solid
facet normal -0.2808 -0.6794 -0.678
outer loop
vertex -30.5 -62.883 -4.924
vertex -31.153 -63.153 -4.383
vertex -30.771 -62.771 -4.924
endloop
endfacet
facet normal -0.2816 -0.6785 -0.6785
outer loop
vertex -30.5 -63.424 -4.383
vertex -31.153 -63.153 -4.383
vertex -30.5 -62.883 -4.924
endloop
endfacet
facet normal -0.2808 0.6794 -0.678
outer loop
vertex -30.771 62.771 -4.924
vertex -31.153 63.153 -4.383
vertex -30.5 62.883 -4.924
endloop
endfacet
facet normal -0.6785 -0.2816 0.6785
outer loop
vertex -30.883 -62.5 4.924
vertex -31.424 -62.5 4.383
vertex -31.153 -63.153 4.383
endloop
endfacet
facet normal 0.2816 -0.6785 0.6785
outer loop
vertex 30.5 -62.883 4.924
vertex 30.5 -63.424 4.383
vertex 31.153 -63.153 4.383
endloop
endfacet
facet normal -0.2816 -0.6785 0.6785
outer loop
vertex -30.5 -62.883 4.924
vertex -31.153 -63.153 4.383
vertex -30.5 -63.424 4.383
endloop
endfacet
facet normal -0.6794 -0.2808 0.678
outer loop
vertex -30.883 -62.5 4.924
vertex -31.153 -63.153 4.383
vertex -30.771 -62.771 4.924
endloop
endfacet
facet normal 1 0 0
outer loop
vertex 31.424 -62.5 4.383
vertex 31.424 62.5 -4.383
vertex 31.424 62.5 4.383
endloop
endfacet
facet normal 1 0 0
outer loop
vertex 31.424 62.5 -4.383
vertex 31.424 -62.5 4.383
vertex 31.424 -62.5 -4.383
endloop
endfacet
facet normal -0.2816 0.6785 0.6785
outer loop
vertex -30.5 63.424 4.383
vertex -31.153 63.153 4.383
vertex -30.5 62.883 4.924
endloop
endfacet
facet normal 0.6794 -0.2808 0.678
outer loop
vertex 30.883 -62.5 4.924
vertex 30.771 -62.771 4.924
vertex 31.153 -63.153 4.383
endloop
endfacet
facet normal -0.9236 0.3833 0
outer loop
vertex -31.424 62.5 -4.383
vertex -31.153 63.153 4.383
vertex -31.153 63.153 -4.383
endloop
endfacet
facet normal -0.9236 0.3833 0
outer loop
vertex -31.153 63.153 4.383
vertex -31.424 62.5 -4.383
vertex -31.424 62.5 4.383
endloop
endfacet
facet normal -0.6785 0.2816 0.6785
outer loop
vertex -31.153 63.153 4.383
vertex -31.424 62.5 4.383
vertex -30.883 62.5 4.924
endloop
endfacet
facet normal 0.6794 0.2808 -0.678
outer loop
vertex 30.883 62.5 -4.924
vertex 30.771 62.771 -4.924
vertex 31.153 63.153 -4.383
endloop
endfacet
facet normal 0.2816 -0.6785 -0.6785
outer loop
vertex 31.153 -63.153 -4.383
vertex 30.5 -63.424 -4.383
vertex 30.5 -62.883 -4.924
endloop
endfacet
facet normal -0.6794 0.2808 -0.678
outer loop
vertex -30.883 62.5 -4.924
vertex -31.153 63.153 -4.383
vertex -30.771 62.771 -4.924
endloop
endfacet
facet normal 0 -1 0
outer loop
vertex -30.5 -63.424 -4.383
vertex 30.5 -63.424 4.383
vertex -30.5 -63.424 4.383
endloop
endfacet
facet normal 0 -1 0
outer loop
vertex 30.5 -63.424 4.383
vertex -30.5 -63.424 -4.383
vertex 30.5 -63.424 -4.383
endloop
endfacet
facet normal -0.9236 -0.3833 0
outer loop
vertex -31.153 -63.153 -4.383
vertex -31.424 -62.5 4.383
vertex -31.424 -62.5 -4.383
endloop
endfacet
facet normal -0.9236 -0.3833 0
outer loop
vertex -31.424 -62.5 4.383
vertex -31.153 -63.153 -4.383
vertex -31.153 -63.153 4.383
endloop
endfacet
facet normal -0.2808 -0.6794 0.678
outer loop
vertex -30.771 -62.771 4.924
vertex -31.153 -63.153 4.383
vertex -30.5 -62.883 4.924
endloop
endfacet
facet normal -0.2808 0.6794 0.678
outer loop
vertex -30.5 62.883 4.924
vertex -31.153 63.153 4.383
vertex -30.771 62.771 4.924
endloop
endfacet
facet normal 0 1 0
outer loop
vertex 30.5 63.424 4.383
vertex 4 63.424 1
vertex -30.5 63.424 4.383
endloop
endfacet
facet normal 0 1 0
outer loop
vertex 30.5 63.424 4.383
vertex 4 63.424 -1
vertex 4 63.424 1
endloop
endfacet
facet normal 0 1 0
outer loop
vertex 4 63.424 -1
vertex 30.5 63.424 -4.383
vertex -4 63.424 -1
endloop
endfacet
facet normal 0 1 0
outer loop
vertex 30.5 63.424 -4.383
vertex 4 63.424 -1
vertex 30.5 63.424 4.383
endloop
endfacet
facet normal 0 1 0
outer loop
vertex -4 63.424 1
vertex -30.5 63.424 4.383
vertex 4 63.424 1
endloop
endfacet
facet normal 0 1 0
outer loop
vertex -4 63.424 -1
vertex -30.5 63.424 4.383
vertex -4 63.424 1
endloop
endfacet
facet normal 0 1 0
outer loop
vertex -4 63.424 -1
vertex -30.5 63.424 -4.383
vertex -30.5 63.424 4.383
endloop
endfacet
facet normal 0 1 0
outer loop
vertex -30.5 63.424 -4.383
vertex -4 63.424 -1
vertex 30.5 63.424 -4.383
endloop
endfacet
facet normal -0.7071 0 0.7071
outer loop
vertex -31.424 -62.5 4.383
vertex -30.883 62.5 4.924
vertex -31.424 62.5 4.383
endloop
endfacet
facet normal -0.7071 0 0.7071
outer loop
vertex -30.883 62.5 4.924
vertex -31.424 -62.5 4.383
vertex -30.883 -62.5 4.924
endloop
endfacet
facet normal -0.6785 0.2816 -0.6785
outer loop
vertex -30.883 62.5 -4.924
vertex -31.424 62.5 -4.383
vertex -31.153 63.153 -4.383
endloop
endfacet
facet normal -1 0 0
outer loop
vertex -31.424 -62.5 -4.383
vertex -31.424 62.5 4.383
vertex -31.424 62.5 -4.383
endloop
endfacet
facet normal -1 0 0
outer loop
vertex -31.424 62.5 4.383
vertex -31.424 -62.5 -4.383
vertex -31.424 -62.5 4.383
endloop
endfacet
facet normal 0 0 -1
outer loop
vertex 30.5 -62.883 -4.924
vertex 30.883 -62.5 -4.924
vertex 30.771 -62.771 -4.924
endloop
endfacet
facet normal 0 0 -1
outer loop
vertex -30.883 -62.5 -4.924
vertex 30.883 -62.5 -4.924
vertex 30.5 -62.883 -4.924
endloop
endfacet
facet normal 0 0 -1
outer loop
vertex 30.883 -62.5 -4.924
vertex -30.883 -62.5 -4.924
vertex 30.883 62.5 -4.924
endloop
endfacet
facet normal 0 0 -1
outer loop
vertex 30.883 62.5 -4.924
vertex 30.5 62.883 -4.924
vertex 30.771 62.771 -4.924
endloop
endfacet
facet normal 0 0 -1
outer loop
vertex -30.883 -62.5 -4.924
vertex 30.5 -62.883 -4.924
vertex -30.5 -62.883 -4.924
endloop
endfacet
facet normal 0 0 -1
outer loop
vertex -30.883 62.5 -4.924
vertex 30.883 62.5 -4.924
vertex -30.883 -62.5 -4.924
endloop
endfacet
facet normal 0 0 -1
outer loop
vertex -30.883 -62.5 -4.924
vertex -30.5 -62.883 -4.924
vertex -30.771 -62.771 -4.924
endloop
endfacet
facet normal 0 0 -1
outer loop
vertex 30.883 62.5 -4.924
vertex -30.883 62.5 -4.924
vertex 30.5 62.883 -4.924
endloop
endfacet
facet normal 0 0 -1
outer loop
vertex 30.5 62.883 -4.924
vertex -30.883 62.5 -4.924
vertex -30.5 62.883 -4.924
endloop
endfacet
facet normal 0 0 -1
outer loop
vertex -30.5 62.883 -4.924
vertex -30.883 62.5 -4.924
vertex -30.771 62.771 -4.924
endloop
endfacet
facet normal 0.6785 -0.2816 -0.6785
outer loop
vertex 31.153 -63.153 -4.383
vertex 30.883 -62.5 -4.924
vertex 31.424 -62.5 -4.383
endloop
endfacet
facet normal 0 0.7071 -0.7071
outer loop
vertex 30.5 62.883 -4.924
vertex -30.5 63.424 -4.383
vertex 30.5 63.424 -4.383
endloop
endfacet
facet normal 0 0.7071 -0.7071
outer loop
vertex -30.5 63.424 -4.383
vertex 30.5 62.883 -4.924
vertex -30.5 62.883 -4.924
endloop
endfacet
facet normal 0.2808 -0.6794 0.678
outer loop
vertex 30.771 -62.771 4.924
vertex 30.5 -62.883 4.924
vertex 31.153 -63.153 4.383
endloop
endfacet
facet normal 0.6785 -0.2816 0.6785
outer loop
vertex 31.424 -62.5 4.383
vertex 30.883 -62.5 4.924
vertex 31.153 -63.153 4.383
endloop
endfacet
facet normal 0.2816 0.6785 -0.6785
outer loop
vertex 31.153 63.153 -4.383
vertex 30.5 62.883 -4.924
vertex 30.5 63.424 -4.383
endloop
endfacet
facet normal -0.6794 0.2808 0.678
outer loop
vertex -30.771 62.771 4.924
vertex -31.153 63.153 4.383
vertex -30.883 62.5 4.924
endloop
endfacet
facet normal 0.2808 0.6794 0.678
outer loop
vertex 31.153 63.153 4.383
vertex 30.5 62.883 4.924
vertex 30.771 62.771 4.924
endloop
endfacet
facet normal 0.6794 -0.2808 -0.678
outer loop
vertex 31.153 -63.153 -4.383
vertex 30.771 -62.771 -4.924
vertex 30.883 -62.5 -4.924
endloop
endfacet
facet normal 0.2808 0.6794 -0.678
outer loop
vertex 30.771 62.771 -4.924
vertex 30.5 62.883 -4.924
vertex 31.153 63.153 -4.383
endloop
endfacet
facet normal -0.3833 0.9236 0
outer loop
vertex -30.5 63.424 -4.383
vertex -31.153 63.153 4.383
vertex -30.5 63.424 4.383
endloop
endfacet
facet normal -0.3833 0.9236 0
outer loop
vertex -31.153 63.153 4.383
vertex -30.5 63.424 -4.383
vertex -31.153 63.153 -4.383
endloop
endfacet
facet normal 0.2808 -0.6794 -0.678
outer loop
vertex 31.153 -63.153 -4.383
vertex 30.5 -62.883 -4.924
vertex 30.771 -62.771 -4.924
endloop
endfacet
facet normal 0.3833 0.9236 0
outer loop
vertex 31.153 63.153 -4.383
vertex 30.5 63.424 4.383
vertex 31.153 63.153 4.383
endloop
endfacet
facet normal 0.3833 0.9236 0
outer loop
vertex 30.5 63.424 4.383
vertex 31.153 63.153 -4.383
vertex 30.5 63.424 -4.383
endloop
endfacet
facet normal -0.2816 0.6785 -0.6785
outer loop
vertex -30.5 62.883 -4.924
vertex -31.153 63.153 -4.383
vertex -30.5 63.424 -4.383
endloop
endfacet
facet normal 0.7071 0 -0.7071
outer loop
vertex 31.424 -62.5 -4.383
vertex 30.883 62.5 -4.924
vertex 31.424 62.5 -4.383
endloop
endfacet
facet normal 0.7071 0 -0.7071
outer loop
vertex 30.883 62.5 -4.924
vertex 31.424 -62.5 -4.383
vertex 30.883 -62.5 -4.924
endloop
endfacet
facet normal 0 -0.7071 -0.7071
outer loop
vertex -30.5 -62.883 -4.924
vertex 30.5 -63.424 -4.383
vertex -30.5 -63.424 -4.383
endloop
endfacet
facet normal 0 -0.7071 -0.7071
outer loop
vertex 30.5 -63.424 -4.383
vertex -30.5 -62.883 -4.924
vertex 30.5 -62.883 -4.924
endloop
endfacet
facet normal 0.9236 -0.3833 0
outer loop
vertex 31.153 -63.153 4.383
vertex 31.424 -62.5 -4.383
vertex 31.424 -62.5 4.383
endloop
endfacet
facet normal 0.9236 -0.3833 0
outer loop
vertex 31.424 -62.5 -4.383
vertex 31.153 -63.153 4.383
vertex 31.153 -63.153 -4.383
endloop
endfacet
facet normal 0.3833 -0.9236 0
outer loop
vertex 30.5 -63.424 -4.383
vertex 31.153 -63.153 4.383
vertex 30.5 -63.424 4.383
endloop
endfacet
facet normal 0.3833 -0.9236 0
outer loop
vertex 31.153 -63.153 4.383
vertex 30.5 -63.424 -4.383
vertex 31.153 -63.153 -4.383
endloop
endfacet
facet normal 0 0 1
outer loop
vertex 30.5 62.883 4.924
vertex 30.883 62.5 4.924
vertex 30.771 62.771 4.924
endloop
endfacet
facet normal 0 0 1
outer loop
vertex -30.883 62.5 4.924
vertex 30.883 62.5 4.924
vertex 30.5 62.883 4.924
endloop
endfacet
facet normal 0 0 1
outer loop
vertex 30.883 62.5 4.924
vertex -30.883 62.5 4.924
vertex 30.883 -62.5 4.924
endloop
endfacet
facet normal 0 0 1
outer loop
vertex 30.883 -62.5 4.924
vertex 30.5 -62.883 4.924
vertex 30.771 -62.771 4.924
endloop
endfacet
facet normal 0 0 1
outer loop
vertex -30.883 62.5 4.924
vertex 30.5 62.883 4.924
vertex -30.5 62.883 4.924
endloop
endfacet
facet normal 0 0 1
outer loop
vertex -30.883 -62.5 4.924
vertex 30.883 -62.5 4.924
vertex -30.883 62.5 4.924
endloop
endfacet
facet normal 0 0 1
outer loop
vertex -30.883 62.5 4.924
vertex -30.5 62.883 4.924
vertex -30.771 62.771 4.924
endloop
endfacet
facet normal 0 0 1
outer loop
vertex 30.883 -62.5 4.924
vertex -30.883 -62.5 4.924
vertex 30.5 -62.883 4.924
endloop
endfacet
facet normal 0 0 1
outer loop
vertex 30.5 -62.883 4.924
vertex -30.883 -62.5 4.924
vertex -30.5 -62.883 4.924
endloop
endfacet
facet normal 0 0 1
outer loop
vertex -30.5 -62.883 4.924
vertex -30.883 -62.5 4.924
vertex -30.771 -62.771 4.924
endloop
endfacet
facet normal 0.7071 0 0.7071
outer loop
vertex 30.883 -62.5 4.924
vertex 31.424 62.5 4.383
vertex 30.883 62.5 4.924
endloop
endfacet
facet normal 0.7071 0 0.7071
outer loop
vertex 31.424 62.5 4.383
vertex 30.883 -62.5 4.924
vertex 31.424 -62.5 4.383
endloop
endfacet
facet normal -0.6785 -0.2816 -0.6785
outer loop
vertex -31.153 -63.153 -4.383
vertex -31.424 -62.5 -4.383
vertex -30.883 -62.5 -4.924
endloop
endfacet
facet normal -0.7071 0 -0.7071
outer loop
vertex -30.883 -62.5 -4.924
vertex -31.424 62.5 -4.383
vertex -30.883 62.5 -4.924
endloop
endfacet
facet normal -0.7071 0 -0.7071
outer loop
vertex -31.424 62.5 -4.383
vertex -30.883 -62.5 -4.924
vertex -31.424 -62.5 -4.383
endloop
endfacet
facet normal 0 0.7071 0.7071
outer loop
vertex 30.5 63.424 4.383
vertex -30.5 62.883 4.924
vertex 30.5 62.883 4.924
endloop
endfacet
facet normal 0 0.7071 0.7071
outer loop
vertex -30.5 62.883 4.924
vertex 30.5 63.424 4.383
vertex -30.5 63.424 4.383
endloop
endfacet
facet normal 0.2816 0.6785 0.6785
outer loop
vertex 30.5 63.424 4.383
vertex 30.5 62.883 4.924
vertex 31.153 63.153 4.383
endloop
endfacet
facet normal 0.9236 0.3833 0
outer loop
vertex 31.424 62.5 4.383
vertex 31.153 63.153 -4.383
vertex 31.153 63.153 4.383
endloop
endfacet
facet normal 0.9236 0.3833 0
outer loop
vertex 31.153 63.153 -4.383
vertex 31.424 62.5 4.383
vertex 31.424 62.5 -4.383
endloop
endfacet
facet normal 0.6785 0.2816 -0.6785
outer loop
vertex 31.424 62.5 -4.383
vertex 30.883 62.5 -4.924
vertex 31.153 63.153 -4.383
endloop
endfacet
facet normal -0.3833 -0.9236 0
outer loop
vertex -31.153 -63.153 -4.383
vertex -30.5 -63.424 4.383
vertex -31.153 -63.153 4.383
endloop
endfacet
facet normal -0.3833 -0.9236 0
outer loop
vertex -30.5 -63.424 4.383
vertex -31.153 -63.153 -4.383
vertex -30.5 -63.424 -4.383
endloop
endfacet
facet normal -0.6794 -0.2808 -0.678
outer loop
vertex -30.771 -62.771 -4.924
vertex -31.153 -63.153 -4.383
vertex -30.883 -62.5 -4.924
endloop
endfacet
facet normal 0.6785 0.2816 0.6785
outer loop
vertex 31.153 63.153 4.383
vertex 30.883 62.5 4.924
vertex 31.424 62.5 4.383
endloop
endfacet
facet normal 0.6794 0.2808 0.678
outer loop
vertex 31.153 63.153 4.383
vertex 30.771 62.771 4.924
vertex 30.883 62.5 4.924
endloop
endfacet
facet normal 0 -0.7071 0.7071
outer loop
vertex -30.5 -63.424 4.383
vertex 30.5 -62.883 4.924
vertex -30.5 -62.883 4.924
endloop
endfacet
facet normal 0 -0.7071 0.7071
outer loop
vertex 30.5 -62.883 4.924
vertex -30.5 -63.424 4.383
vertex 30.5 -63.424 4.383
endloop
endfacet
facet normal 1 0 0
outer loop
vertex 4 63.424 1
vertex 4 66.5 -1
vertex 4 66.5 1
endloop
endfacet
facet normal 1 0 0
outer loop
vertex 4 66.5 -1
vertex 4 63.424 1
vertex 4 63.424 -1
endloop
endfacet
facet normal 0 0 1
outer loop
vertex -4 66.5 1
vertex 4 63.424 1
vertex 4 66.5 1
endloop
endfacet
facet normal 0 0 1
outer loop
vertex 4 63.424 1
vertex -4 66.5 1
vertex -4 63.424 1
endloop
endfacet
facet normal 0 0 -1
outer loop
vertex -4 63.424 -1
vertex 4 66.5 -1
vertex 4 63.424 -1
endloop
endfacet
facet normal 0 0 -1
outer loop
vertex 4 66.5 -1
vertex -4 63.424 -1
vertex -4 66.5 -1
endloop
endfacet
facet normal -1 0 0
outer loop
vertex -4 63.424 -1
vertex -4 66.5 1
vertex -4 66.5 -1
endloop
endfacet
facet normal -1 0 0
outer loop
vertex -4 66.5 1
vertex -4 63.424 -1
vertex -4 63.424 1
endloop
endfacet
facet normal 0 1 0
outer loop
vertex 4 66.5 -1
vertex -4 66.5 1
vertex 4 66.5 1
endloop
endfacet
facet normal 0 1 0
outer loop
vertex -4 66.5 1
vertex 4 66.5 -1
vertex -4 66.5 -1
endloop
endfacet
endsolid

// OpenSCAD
//phone
module phone()
{

	union(){
		color("silver") minkowski()
		{
			cube(size=[61,125,8], center=true);
			//cylinder(r=1,h=1);
			sphere(r=1,$fn=8);
		}
		
		//usb connector
		color("red")
		translate([0,62.5,0]){
			cube(size=[8,8,2],center=true);
		}
	}
};

module dock(deep){
	phone();	
};

dock(60);
